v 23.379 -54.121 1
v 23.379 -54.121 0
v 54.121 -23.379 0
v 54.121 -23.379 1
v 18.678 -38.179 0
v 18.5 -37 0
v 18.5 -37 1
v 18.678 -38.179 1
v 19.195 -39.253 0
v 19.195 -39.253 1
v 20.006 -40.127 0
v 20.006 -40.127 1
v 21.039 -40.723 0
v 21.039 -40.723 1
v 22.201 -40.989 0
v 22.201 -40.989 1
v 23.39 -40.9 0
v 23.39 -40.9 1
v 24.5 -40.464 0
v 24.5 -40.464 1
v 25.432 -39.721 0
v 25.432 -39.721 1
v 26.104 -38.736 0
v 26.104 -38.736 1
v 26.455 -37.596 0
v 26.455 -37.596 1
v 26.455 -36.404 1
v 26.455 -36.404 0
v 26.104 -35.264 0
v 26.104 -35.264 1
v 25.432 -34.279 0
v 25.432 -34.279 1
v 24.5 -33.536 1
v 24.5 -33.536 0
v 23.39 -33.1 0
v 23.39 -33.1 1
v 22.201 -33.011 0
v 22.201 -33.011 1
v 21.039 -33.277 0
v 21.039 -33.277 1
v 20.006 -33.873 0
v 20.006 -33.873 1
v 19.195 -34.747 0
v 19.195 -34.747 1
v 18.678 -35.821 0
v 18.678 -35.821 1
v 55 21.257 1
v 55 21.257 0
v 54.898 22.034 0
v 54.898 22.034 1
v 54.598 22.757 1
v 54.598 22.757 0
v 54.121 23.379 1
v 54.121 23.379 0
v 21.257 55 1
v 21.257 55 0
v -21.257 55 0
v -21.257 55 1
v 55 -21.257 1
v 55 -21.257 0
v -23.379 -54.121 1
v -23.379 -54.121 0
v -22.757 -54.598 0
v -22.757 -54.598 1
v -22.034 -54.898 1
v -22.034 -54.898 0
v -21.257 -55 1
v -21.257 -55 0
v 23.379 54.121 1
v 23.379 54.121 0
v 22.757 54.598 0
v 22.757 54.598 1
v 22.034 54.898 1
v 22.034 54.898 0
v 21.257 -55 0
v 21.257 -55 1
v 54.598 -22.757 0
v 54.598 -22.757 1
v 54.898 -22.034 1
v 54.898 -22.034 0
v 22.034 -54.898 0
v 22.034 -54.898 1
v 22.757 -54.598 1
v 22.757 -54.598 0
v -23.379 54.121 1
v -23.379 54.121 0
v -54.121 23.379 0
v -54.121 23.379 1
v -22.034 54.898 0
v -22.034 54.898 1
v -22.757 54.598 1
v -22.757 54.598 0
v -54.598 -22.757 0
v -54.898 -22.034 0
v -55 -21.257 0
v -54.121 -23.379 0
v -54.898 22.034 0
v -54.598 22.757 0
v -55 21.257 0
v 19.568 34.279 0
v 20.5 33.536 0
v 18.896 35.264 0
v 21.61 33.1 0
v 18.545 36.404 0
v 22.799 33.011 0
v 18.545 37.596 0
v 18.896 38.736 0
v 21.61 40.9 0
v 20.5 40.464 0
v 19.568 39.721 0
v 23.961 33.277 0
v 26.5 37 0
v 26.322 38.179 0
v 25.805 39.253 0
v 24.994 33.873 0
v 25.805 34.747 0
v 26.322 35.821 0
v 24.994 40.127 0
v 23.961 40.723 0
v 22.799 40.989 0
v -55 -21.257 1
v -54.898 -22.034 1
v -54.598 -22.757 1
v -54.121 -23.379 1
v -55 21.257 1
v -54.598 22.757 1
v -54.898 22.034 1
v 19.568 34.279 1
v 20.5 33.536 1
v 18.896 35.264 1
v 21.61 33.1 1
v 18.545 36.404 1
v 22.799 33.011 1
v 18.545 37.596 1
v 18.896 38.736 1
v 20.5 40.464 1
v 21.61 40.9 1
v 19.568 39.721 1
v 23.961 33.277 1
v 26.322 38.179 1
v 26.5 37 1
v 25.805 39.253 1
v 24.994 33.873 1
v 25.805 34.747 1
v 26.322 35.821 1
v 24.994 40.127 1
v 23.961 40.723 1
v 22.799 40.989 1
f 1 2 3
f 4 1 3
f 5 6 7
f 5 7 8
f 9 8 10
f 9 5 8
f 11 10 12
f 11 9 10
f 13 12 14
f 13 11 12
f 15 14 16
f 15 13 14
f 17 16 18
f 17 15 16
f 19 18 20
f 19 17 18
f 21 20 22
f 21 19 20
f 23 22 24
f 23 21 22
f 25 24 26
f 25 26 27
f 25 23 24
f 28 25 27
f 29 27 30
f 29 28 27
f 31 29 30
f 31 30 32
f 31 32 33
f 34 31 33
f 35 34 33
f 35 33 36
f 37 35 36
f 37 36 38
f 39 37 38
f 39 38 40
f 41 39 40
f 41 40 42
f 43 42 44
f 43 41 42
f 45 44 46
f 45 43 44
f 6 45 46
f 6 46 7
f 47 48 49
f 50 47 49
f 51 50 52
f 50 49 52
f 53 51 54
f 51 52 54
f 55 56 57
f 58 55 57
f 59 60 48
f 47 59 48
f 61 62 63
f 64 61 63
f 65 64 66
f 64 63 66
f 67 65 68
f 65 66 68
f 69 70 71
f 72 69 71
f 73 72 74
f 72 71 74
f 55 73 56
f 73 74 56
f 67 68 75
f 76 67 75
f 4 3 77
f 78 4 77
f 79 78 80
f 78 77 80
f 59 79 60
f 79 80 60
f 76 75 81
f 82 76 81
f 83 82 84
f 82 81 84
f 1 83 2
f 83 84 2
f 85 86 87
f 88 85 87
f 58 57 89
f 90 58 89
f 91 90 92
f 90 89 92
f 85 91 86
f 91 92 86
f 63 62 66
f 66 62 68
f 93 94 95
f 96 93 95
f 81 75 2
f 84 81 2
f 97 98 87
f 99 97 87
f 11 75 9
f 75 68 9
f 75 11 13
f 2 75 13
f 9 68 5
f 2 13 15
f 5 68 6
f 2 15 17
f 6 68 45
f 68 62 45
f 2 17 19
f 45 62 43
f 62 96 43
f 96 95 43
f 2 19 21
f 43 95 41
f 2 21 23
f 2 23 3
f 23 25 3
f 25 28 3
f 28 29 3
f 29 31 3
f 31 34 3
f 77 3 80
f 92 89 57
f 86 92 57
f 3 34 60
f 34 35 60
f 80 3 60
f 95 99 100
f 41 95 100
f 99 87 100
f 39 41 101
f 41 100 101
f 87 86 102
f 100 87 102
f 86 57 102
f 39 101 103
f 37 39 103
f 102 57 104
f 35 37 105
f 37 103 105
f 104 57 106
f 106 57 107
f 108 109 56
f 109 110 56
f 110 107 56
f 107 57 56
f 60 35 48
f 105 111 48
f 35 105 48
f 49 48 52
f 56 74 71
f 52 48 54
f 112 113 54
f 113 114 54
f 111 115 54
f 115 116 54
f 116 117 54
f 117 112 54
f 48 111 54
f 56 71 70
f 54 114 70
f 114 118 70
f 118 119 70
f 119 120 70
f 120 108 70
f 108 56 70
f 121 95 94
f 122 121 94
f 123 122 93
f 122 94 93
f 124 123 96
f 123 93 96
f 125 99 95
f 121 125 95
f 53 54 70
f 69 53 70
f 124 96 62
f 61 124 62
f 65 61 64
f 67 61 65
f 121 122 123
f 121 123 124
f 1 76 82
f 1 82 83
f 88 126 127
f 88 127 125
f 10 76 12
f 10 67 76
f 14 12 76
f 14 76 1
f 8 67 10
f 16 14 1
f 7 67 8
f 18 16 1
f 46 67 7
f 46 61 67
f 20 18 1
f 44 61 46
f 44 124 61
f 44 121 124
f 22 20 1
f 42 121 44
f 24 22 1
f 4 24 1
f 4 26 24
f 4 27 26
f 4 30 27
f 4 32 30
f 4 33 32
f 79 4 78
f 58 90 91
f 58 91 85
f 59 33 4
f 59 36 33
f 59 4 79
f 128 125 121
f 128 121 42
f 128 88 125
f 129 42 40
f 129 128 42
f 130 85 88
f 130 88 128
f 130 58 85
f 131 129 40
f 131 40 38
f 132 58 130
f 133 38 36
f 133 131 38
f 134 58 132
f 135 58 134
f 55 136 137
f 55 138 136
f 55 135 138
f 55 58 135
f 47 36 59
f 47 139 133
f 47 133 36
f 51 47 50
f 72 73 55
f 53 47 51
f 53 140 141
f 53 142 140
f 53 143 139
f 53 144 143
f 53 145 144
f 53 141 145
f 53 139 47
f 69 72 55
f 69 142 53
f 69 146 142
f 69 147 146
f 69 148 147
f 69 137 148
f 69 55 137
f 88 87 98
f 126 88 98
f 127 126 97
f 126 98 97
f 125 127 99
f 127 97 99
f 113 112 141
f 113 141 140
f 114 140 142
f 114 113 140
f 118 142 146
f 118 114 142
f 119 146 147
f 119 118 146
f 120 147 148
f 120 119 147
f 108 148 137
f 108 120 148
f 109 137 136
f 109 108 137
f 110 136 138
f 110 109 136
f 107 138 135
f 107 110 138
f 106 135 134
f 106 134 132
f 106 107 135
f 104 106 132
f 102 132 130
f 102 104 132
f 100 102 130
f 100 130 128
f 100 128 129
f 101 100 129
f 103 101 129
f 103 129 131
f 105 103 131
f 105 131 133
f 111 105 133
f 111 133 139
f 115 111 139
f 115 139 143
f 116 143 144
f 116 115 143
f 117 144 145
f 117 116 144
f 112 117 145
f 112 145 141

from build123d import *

# Parameters (mm, degrees)
SKETCH3_R           = 4
BOSS_EXTRUDE1_DEPTH = 1


with BuildPart() as part:
    # Sketch3 → Boss-Extrude1 (new body)
    with BuildSketch(Plane.XY):
        with BuildLine():
            Line((55, -21.257359313), (55, 21.257359313))
            ThreePointArc((55, 21.257359313), (54.771638598, 22.40540961), (54.121320344, 23.378679656))
            Line((54.121320344, 23.378679656), (23.378679656, 54.121320344))
            ThreePointArc((23.378679656, 54.121320344), (22.40540961, 54.771638598), (21.257359313, 55))
            Line((21.257359313, 55), (-21.257359313, 55))
            ThreePointArc((-21.257359313, 55), (-22.40540961, 54.771638598), (-23.378679656, 54.121320344))
            Line((-23.378679656, 54.121320344), (-54.121320344, 23.378679656))
            ThreePointArc((-54.121320344, 23.378679656), (-54.771638598, 22.40540961), (-55, 21.257359313))
            Line((-55, 21.257359313), (-55, -21.257359313))
            ThreePointArc((-55, -21.257359313), (-54.771638598, -22.40540961), (-54.121320344, -23.378679656))
            Line((-54.121320344, -23.378679656), (-23.378679656, -54.121320344))
            ThreePointArc((-23.378679656, -54.121320344), (-22.40540961, -54.771638598), (-21.257359313, -55))
            Line((-21.257359313, -55), (21.257359313, -55))
            ThreePointArc((21.257359313, -55), (22.40540961, -54.771638598), (23.378679656, -54.121320344))
            Line((23.378679656, -54.121320344), (54.121320344, -23.378679656))
            ThreePointArc((54.121320344, -23.378679656), (54.771638598, -22.40540961), (55, -21.257359313))
        make_face()
        with Locations((22.5, 37)):
            Circle(SKETCH3_R, mode=Mode.SUBTRACT)
        with Locations(Location((22.5, -37, 0), (0, 0, 180))):
            Circle(SKETCH3_R, mode=Mode.SUBTRACT)
    extrude(amount=BOSS_EXTRUDE1_DEPTH)


solid = part.part
